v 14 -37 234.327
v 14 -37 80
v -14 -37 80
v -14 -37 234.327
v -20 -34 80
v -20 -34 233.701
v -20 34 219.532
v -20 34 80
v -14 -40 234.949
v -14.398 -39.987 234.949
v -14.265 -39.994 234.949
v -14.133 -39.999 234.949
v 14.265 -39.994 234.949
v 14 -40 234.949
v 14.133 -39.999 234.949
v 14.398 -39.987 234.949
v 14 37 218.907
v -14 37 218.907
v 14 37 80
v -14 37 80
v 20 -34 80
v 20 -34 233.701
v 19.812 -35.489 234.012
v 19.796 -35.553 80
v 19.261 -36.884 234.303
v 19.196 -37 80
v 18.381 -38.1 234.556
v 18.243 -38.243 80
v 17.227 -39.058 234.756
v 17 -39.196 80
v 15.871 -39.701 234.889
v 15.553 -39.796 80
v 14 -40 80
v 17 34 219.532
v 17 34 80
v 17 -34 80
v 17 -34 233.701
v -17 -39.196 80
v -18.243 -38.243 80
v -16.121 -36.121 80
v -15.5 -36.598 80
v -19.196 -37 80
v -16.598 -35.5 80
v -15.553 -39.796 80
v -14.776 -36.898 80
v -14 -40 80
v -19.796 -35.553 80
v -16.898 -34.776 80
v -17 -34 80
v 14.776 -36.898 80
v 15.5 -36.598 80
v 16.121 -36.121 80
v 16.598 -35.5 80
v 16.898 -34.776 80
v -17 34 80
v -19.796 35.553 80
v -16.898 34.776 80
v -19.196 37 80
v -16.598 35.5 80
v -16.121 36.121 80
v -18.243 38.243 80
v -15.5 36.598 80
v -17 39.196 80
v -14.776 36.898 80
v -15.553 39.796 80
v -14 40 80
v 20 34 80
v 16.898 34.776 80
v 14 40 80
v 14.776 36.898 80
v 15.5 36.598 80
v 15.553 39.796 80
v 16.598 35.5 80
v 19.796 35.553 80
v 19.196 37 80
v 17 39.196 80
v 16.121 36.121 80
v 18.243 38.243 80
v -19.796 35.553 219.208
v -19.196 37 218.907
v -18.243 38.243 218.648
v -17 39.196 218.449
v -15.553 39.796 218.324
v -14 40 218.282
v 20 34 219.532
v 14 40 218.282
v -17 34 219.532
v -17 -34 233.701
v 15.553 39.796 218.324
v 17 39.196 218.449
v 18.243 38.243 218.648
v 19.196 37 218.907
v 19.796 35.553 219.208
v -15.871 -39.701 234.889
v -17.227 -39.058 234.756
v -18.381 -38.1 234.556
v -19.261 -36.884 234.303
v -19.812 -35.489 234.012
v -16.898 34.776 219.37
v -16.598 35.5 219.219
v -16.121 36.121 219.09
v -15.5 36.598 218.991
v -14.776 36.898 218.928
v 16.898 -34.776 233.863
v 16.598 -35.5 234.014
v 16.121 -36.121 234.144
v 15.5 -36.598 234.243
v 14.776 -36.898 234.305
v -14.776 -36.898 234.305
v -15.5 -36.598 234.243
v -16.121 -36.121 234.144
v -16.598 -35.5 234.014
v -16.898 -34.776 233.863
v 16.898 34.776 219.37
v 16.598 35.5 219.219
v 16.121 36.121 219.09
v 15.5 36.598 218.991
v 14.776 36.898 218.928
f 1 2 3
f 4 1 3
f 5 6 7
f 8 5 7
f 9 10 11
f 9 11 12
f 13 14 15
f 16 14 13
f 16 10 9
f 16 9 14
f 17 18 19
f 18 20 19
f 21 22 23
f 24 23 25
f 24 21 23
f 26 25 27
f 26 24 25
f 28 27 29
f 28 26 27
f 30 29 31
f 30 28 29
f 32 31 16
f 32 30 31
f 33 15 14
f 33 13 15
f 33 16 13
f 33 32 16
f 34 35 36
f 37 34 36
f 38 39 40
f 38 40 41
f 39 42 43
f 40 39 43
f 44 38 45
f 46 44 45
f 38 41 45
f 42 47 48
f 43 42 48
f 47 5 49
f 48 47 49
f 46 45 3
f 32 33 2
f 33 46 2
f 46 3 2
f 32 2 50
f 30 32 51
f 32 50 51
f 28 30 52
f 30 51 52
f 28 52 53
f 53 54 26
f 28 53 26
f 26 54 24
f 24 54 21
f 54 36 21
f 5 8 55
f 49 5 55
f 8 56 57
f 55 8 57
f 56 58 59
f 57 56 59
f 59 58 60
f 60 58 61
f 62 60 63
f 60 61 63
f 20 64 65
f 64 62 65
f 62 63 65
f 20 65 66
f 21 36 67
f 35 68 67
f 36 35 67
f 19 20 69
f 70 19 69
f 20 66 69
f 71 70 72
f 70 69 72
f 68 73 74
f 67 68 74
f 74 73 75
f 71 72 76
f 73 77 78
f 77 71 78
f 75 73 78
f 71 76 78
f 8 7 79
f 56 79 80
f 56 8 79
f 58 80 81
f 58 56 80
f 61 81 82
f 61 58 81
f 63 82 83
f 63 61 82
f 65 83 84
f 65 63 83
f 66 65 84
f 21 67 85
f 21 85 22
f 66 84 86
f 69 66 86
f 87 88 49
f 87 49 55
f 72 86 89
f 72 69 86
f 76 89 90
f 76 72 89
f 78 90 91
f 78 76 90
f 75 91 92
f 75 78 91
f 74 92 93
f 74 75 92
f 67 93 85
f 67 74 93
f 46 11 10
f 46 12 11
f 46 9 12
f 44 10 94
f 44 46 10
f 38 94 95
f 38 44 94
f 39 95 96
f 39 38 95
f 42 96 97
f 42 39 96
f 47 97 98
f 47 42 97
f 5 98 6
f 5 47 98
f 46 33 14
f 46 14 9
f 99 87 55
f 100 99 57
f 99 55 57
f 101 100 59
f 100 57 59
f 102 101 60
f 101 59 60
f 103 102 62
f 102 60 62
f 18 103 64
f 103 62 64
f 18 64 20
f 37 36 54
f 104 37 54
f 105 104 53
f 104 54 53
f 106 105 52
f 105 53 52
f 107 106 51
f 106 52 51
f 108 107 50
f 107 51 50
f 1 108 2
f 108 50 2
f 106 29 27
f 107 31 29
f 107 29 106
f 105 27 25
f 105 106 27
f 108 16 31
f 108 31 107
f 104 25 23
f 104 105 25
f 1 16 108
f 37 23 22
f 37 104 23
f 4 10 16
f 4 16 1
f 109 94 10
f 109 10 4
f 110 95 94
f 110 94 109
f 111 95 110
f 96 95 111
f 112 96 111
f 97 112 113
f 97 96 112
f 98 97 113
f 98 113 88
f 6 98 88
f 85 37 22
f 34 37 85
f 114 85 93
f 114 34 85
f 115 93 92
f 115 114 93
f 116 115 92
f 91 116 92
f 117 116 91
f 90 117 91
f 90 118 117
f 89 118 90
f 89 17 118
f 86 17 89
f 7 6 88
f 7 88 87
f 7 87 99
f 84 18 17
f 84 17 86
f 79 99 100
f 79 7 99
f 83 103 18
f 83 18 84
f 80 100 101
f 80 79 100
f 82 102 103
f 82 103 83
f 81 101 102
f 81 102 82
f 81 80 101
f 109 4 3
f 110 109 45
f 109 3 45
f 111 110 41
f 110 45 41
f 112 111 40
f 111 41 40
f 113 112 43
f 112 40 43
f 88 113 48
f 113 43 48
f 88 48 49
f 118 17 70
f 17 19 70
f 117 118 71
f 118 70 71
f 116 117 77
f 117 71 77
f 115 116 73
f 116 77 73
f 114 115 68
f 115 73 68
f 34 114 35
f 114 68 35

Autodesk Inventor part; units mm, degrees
ref_plane "Start Plane" through (0, 0, 80) normal (0, 0, 1) x (1, 0, 0)
ref_plane "End Plane" through (0, 0, 234.949) normal (0, 0, 1) x (1, 0, 0)
sketch "Sketch" plane through (0, 0, 0) normal (0, 0, 1) x (1, 0, 0)
  line L0 (-20, -34) -> (-20, 34)
  line L1 (-14, 40) -> (14, 40)
  line L2 (20, 34) -> (20, -34)
  line L3 (14, -40) -> (-14, -40)
  arc A0 (-20, -34) -> (-14, -40) centre (-14, -34) ccw
  arc A1 (20, 34) -> (14, 40) centre (14, 34) ccw
  arc A2 (-14, 40) -> (-20, 34) centre (-14, 34) ccw
  arc A3 (14, -40) -> (20, -34) centre (14, -34) ccw
  arc A4 (-14, 37) -> (-17, 34) centre (-14, 34) ccw
  line L4 (-14, 37) -> (14, 37)
  arc A5 (17, 34) -> (14, 37) centre (14, 34) ccw
  line L5 (17, 34) -> (17, -34)
  arc A6 (14, -37) -> (17, -34) centre (14, -34) ccw
  line L6 (14, -37) -> (-14, -37)
  arc A7 (-17, -34) -> (-14, -37) centre (-14, -34) ccw
  line L7 (-17, -34) -> (-17, 34)
  line L8 (0, 57.7397) -> (0, -57.7397) construction
  line L9 (-29.7397, 0) -> (29.7397, 0) construction
  dimension "d7" = 6
  dimension "d9" = 40
  dimension "d11" = 80
  dimension "d12" = 3
  dimension "d15" = 20
  dimension "d16" = 40
extrude "Body" add sketch "Sketch" along normal up to surface (154.949 mm away) from surface at 80
sketch "Sketch3" plane through (0, 0, 0) normal (0, 0, 1) x (1, 0, 0)
  line L0 (0, 0) -> (10, 0)
ref_plane "Work Plane3" through (0, 0, 0) normal (0, -1, 0) x (1, 0, 0)
ref_plane "Work Plane4" through (14, 23.6837, 221.6816) normal (0, 0.204, 0.979) x (1, 0, 0)
split "Split1" plane through (14, 23.6837, 221.6816) removes the side toward (0, 0.204, 0.979)
sketch "Sketch4" plane through (0, 0, 0) normal (0, -1, 0) x (1, 0, 0)
  line L0 (-2, 80) -> (12, 80) projected
  line L1 (-2, 234.949) -> (12, 234.949) projected
  dimension "d18" = 154.949
equation "\"d7\" = G_IR"
equation "\"d9\" = G_W"
equation "\"d11\" = G_H"
equation "\"d12\" = G_T"
equation "\"d15\" = 0.5 * d9"
equation "\"d16\" = 0.5 * d11"
equation "\"d3\" = G_L"
equation "\"G_W\" = 40"
equation "\"G_H\" = 80"
equation "\"G_T\" = 3"
equation "\"G_IR\" = 6"
equation "\"G_L\" = d18"
equation "\"G_OFFSET_END\" = -65.051"
equation "\"d14\" = G_OFFSET_END + B_L"
equation "\"B_L\" = 300"
properties part number "ISO 10799-2 - 80x40x3 - 154.95" material "Steel, Mild"
